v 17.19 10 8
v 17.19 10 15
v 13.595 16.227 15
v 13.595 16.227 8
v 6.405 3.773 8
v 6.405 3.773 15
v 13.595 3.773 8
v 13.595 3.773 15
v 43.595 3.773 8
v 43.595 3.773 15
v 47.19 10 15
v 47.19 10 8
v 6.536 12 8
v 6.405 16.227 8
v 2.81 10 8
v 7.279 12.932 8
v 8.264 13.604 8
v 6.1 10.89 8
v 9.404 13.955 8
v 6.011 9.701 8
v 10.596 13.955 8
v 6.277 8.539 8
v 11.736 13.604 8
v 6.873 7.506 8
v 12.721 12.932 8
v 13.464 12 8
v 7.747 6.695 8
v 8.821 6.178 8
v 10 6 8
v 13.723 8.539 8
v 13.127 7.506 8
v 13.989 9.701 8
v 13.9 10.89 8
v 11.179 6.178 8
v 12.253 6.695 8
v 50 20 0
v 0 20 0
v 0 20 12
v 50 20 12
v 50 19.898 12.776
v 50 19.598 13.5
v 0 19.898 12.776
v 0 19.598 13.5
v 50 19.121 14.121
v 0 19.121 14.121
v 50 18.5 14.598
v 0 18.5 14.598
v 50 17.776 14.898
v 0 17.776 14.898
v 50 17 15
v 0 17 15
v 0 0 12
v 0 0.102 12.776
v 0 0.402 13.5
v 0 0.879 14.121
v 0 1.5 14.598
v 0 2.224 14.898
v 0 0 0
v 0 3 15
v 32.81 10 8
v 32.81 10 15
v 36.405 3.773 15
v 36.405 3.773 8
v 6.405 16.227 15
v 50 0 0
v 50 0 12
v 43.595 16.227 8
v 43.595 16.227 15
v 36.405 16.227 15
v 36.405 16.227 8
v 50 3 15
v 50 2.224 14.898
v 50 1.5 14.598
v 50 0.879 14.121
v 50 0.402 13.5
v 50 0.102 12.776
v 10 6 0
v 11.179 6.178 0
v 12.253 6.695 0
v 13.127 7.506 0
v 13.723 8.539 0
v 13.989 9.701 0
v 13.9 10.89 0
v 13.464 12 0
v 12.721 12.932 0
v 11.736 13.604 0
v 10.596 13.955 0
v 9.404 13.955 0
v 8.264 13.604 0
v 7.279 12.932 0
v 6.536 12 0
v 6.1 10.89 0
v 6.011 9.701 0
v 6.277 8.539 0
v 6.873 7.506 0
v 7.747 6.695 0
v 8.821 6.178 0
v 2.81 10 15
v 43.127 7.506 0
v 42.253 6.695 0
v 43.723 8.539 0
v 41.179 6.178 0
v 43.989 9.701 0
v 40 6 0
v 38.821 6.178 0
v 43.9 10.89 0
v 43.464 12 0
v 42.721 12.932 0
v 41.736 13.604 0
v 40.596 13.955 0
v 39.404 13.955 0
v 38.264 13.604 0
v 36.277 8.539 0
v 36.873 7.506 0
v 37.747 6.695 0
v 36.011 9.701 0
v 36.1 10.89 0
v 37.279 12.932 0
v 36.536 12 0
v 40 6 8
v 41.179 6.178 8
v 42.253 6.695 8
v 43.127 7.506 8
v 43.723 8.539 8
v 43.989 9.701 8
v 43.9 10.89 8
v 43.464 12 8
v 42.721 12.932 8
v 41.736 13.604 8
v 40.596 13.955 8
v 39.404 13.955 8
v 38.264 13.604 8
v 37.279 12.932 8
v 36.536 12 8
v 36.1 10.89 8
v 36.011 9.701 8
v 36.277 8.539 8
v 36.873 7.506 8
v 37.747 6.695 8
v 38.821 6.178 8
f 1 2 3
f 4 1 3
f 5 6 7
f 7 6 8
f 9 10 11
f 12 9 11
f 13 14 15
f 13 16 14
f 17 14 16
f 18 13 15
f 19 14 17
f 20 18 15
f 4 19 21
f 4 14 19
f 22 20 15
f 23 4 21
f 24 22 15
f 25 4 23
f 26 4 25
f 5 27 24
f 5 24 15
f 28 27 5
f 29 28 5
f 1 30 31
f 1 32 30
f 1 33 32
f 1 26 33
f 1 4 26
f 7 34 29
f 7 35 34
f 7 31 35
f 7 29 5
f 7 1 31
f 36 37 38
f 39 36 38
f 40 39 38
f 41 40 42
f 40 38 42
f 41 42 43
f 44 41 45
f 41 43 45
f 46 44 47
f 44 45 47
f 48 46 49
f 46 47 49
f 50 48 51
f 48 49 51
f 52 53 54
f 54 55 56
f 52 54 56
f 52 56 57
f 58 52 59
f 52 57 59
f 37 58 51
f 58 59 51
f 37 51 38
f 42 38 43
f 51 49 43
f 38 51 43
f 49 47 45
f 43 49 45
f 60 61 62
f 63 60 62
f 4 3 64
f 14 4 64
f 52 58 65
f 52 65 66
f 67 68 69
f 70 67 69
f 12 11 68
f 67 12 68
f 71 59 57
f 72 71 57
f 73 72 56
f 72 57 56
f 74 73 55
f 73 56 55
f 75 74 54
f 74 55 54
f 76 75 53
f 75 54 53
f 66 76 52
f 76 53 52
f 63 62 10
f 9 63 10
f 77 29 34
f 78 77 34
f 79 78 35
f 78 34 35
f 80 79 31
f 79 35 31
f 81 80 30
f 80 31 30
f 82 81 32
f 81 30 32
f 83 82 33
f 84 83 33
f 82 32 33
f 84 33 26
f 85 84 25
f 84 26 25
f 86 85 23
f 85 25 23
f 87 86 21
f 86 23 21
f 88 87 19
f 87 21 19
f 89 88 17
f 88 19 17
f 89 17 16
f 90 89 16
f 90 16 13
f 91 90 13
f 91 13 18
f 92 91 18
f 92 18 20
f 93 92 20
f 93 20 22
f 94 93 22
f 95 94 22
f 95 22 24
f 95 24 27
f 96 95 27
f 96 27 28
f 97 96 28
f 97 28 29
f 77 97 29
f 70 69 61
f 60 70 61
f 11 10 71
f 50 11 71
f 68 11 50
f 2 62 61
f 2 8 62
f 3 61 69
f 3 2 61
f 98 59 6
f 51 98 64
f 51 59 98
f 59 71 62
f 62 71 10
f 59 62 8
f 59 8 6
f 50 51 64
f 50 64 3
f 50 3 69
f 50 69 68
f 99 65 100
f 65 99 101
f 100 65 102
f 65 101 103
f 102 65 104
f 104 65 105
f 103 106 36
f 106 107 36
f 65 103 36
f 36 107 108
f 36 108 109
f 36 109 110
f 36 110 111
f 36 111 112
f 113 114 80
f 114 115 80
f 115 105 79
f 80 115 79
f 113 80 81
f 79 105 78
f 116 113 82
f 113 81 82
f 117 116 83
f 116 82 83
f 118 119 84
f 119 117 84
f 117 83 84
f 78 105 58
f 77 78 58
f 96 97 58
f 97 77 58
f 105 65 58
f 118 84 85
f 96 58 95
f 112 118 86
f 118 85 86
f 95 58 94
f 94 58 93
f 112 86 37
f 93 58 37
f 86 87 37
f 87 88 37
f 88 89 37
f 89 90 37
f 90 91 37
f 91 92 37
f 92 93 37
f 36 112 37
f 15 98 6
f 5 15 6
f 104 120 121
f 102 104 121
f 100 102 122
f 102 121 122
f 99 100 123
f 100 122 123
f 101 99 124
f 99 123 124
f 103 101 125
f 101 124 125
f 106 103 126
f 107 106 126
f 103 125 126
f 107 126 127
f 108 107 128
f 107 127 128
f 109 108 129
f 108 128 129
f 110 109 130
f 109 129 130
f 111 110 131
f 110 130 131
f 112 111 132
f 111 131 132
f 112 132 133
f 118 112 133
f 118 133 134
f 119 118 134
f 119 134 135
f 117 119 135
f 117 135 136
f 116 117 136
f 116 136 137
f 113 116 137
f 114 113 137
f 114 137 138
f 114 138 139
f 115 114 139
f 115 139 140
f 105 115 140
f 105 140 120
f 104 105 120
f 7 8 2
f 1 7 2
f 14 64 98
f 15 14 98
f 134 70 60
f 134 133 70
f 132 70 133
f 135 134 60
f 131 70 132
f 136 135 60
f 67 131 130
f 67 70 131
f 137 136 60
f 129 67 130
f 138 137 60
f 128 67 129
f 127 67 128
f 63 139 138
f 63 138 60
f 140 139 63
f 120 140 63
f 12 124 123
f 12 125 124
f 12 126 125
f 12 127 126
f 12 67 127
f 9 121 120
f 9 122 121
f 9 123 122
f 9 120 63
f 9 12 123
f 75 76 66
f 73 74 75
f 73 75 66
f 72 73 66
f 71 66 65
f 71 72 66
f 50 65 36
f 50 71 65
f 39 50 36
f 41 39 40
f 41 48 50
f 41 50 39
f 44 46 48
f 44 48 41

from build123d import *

# Parameters (mm, degrees)
PAD_DEPTH       = 50
SKETCH001_R     = 4
POCKET_DEPTH    = 15.001
POCKET001_DEPTH = 7


with BuildPart() as part:
    # Sketch → Pad (new body)
    with BuildSketch(Plane.YZ):
        with BuildLine():
            Line((0, 0), (20, 0))
            Line((20, 0), (20, 12))
            ThreePointArc((20, 12), (19.12132, 14.12132), (17, 15))
            Line((3, 15), (17, 15))
            ThreePointArc((3, 15), (0.87868, 14.12132), (0, 12))
            Line((0, 0), (0, 12))
        make_face()
    extrude(amount=PAD_DEPTH)

    # Sketch001 → Pocket (cut, through all)
    with BuildSketch(Plane(origin=(0, 0, 15), x_dir=(0, -1, 0), z_dir=(0, 0, 1))):
        with Locations((-10, 40)):
            Circle(SKETCH001_R)
        with Locations((-10, 10)):
            Circle(SKETCH001_R)
    extrude(amount=-POCKET_DEPTH, mode=Mode.SUBTRACT)

    # Sketch002 → Pocket001 (cut)
    with BuildSketch(Plane(origin=(0, 0, 15), x_dir=(0, -1, 0), z_dir=(0, 0, 1))):
        Polygon((-16.226723, 36.405), (-10, 32.81), (-3.773277, 36.405), (-3.773277, 43.595), (-10, 47.19), (-16.226723, 43.595), align=None)
        Polygon((-16.226723, 6.405), (-10, 2.81), (-3.773277, 6.405), (-3.773277, 13.595), (-10, 17.19), (-16.226723, 13.595), align=None)
    extrude(amount=-POCKET001_DEPTH, mode=Mode.SUBTRACT)


solid = part.part
